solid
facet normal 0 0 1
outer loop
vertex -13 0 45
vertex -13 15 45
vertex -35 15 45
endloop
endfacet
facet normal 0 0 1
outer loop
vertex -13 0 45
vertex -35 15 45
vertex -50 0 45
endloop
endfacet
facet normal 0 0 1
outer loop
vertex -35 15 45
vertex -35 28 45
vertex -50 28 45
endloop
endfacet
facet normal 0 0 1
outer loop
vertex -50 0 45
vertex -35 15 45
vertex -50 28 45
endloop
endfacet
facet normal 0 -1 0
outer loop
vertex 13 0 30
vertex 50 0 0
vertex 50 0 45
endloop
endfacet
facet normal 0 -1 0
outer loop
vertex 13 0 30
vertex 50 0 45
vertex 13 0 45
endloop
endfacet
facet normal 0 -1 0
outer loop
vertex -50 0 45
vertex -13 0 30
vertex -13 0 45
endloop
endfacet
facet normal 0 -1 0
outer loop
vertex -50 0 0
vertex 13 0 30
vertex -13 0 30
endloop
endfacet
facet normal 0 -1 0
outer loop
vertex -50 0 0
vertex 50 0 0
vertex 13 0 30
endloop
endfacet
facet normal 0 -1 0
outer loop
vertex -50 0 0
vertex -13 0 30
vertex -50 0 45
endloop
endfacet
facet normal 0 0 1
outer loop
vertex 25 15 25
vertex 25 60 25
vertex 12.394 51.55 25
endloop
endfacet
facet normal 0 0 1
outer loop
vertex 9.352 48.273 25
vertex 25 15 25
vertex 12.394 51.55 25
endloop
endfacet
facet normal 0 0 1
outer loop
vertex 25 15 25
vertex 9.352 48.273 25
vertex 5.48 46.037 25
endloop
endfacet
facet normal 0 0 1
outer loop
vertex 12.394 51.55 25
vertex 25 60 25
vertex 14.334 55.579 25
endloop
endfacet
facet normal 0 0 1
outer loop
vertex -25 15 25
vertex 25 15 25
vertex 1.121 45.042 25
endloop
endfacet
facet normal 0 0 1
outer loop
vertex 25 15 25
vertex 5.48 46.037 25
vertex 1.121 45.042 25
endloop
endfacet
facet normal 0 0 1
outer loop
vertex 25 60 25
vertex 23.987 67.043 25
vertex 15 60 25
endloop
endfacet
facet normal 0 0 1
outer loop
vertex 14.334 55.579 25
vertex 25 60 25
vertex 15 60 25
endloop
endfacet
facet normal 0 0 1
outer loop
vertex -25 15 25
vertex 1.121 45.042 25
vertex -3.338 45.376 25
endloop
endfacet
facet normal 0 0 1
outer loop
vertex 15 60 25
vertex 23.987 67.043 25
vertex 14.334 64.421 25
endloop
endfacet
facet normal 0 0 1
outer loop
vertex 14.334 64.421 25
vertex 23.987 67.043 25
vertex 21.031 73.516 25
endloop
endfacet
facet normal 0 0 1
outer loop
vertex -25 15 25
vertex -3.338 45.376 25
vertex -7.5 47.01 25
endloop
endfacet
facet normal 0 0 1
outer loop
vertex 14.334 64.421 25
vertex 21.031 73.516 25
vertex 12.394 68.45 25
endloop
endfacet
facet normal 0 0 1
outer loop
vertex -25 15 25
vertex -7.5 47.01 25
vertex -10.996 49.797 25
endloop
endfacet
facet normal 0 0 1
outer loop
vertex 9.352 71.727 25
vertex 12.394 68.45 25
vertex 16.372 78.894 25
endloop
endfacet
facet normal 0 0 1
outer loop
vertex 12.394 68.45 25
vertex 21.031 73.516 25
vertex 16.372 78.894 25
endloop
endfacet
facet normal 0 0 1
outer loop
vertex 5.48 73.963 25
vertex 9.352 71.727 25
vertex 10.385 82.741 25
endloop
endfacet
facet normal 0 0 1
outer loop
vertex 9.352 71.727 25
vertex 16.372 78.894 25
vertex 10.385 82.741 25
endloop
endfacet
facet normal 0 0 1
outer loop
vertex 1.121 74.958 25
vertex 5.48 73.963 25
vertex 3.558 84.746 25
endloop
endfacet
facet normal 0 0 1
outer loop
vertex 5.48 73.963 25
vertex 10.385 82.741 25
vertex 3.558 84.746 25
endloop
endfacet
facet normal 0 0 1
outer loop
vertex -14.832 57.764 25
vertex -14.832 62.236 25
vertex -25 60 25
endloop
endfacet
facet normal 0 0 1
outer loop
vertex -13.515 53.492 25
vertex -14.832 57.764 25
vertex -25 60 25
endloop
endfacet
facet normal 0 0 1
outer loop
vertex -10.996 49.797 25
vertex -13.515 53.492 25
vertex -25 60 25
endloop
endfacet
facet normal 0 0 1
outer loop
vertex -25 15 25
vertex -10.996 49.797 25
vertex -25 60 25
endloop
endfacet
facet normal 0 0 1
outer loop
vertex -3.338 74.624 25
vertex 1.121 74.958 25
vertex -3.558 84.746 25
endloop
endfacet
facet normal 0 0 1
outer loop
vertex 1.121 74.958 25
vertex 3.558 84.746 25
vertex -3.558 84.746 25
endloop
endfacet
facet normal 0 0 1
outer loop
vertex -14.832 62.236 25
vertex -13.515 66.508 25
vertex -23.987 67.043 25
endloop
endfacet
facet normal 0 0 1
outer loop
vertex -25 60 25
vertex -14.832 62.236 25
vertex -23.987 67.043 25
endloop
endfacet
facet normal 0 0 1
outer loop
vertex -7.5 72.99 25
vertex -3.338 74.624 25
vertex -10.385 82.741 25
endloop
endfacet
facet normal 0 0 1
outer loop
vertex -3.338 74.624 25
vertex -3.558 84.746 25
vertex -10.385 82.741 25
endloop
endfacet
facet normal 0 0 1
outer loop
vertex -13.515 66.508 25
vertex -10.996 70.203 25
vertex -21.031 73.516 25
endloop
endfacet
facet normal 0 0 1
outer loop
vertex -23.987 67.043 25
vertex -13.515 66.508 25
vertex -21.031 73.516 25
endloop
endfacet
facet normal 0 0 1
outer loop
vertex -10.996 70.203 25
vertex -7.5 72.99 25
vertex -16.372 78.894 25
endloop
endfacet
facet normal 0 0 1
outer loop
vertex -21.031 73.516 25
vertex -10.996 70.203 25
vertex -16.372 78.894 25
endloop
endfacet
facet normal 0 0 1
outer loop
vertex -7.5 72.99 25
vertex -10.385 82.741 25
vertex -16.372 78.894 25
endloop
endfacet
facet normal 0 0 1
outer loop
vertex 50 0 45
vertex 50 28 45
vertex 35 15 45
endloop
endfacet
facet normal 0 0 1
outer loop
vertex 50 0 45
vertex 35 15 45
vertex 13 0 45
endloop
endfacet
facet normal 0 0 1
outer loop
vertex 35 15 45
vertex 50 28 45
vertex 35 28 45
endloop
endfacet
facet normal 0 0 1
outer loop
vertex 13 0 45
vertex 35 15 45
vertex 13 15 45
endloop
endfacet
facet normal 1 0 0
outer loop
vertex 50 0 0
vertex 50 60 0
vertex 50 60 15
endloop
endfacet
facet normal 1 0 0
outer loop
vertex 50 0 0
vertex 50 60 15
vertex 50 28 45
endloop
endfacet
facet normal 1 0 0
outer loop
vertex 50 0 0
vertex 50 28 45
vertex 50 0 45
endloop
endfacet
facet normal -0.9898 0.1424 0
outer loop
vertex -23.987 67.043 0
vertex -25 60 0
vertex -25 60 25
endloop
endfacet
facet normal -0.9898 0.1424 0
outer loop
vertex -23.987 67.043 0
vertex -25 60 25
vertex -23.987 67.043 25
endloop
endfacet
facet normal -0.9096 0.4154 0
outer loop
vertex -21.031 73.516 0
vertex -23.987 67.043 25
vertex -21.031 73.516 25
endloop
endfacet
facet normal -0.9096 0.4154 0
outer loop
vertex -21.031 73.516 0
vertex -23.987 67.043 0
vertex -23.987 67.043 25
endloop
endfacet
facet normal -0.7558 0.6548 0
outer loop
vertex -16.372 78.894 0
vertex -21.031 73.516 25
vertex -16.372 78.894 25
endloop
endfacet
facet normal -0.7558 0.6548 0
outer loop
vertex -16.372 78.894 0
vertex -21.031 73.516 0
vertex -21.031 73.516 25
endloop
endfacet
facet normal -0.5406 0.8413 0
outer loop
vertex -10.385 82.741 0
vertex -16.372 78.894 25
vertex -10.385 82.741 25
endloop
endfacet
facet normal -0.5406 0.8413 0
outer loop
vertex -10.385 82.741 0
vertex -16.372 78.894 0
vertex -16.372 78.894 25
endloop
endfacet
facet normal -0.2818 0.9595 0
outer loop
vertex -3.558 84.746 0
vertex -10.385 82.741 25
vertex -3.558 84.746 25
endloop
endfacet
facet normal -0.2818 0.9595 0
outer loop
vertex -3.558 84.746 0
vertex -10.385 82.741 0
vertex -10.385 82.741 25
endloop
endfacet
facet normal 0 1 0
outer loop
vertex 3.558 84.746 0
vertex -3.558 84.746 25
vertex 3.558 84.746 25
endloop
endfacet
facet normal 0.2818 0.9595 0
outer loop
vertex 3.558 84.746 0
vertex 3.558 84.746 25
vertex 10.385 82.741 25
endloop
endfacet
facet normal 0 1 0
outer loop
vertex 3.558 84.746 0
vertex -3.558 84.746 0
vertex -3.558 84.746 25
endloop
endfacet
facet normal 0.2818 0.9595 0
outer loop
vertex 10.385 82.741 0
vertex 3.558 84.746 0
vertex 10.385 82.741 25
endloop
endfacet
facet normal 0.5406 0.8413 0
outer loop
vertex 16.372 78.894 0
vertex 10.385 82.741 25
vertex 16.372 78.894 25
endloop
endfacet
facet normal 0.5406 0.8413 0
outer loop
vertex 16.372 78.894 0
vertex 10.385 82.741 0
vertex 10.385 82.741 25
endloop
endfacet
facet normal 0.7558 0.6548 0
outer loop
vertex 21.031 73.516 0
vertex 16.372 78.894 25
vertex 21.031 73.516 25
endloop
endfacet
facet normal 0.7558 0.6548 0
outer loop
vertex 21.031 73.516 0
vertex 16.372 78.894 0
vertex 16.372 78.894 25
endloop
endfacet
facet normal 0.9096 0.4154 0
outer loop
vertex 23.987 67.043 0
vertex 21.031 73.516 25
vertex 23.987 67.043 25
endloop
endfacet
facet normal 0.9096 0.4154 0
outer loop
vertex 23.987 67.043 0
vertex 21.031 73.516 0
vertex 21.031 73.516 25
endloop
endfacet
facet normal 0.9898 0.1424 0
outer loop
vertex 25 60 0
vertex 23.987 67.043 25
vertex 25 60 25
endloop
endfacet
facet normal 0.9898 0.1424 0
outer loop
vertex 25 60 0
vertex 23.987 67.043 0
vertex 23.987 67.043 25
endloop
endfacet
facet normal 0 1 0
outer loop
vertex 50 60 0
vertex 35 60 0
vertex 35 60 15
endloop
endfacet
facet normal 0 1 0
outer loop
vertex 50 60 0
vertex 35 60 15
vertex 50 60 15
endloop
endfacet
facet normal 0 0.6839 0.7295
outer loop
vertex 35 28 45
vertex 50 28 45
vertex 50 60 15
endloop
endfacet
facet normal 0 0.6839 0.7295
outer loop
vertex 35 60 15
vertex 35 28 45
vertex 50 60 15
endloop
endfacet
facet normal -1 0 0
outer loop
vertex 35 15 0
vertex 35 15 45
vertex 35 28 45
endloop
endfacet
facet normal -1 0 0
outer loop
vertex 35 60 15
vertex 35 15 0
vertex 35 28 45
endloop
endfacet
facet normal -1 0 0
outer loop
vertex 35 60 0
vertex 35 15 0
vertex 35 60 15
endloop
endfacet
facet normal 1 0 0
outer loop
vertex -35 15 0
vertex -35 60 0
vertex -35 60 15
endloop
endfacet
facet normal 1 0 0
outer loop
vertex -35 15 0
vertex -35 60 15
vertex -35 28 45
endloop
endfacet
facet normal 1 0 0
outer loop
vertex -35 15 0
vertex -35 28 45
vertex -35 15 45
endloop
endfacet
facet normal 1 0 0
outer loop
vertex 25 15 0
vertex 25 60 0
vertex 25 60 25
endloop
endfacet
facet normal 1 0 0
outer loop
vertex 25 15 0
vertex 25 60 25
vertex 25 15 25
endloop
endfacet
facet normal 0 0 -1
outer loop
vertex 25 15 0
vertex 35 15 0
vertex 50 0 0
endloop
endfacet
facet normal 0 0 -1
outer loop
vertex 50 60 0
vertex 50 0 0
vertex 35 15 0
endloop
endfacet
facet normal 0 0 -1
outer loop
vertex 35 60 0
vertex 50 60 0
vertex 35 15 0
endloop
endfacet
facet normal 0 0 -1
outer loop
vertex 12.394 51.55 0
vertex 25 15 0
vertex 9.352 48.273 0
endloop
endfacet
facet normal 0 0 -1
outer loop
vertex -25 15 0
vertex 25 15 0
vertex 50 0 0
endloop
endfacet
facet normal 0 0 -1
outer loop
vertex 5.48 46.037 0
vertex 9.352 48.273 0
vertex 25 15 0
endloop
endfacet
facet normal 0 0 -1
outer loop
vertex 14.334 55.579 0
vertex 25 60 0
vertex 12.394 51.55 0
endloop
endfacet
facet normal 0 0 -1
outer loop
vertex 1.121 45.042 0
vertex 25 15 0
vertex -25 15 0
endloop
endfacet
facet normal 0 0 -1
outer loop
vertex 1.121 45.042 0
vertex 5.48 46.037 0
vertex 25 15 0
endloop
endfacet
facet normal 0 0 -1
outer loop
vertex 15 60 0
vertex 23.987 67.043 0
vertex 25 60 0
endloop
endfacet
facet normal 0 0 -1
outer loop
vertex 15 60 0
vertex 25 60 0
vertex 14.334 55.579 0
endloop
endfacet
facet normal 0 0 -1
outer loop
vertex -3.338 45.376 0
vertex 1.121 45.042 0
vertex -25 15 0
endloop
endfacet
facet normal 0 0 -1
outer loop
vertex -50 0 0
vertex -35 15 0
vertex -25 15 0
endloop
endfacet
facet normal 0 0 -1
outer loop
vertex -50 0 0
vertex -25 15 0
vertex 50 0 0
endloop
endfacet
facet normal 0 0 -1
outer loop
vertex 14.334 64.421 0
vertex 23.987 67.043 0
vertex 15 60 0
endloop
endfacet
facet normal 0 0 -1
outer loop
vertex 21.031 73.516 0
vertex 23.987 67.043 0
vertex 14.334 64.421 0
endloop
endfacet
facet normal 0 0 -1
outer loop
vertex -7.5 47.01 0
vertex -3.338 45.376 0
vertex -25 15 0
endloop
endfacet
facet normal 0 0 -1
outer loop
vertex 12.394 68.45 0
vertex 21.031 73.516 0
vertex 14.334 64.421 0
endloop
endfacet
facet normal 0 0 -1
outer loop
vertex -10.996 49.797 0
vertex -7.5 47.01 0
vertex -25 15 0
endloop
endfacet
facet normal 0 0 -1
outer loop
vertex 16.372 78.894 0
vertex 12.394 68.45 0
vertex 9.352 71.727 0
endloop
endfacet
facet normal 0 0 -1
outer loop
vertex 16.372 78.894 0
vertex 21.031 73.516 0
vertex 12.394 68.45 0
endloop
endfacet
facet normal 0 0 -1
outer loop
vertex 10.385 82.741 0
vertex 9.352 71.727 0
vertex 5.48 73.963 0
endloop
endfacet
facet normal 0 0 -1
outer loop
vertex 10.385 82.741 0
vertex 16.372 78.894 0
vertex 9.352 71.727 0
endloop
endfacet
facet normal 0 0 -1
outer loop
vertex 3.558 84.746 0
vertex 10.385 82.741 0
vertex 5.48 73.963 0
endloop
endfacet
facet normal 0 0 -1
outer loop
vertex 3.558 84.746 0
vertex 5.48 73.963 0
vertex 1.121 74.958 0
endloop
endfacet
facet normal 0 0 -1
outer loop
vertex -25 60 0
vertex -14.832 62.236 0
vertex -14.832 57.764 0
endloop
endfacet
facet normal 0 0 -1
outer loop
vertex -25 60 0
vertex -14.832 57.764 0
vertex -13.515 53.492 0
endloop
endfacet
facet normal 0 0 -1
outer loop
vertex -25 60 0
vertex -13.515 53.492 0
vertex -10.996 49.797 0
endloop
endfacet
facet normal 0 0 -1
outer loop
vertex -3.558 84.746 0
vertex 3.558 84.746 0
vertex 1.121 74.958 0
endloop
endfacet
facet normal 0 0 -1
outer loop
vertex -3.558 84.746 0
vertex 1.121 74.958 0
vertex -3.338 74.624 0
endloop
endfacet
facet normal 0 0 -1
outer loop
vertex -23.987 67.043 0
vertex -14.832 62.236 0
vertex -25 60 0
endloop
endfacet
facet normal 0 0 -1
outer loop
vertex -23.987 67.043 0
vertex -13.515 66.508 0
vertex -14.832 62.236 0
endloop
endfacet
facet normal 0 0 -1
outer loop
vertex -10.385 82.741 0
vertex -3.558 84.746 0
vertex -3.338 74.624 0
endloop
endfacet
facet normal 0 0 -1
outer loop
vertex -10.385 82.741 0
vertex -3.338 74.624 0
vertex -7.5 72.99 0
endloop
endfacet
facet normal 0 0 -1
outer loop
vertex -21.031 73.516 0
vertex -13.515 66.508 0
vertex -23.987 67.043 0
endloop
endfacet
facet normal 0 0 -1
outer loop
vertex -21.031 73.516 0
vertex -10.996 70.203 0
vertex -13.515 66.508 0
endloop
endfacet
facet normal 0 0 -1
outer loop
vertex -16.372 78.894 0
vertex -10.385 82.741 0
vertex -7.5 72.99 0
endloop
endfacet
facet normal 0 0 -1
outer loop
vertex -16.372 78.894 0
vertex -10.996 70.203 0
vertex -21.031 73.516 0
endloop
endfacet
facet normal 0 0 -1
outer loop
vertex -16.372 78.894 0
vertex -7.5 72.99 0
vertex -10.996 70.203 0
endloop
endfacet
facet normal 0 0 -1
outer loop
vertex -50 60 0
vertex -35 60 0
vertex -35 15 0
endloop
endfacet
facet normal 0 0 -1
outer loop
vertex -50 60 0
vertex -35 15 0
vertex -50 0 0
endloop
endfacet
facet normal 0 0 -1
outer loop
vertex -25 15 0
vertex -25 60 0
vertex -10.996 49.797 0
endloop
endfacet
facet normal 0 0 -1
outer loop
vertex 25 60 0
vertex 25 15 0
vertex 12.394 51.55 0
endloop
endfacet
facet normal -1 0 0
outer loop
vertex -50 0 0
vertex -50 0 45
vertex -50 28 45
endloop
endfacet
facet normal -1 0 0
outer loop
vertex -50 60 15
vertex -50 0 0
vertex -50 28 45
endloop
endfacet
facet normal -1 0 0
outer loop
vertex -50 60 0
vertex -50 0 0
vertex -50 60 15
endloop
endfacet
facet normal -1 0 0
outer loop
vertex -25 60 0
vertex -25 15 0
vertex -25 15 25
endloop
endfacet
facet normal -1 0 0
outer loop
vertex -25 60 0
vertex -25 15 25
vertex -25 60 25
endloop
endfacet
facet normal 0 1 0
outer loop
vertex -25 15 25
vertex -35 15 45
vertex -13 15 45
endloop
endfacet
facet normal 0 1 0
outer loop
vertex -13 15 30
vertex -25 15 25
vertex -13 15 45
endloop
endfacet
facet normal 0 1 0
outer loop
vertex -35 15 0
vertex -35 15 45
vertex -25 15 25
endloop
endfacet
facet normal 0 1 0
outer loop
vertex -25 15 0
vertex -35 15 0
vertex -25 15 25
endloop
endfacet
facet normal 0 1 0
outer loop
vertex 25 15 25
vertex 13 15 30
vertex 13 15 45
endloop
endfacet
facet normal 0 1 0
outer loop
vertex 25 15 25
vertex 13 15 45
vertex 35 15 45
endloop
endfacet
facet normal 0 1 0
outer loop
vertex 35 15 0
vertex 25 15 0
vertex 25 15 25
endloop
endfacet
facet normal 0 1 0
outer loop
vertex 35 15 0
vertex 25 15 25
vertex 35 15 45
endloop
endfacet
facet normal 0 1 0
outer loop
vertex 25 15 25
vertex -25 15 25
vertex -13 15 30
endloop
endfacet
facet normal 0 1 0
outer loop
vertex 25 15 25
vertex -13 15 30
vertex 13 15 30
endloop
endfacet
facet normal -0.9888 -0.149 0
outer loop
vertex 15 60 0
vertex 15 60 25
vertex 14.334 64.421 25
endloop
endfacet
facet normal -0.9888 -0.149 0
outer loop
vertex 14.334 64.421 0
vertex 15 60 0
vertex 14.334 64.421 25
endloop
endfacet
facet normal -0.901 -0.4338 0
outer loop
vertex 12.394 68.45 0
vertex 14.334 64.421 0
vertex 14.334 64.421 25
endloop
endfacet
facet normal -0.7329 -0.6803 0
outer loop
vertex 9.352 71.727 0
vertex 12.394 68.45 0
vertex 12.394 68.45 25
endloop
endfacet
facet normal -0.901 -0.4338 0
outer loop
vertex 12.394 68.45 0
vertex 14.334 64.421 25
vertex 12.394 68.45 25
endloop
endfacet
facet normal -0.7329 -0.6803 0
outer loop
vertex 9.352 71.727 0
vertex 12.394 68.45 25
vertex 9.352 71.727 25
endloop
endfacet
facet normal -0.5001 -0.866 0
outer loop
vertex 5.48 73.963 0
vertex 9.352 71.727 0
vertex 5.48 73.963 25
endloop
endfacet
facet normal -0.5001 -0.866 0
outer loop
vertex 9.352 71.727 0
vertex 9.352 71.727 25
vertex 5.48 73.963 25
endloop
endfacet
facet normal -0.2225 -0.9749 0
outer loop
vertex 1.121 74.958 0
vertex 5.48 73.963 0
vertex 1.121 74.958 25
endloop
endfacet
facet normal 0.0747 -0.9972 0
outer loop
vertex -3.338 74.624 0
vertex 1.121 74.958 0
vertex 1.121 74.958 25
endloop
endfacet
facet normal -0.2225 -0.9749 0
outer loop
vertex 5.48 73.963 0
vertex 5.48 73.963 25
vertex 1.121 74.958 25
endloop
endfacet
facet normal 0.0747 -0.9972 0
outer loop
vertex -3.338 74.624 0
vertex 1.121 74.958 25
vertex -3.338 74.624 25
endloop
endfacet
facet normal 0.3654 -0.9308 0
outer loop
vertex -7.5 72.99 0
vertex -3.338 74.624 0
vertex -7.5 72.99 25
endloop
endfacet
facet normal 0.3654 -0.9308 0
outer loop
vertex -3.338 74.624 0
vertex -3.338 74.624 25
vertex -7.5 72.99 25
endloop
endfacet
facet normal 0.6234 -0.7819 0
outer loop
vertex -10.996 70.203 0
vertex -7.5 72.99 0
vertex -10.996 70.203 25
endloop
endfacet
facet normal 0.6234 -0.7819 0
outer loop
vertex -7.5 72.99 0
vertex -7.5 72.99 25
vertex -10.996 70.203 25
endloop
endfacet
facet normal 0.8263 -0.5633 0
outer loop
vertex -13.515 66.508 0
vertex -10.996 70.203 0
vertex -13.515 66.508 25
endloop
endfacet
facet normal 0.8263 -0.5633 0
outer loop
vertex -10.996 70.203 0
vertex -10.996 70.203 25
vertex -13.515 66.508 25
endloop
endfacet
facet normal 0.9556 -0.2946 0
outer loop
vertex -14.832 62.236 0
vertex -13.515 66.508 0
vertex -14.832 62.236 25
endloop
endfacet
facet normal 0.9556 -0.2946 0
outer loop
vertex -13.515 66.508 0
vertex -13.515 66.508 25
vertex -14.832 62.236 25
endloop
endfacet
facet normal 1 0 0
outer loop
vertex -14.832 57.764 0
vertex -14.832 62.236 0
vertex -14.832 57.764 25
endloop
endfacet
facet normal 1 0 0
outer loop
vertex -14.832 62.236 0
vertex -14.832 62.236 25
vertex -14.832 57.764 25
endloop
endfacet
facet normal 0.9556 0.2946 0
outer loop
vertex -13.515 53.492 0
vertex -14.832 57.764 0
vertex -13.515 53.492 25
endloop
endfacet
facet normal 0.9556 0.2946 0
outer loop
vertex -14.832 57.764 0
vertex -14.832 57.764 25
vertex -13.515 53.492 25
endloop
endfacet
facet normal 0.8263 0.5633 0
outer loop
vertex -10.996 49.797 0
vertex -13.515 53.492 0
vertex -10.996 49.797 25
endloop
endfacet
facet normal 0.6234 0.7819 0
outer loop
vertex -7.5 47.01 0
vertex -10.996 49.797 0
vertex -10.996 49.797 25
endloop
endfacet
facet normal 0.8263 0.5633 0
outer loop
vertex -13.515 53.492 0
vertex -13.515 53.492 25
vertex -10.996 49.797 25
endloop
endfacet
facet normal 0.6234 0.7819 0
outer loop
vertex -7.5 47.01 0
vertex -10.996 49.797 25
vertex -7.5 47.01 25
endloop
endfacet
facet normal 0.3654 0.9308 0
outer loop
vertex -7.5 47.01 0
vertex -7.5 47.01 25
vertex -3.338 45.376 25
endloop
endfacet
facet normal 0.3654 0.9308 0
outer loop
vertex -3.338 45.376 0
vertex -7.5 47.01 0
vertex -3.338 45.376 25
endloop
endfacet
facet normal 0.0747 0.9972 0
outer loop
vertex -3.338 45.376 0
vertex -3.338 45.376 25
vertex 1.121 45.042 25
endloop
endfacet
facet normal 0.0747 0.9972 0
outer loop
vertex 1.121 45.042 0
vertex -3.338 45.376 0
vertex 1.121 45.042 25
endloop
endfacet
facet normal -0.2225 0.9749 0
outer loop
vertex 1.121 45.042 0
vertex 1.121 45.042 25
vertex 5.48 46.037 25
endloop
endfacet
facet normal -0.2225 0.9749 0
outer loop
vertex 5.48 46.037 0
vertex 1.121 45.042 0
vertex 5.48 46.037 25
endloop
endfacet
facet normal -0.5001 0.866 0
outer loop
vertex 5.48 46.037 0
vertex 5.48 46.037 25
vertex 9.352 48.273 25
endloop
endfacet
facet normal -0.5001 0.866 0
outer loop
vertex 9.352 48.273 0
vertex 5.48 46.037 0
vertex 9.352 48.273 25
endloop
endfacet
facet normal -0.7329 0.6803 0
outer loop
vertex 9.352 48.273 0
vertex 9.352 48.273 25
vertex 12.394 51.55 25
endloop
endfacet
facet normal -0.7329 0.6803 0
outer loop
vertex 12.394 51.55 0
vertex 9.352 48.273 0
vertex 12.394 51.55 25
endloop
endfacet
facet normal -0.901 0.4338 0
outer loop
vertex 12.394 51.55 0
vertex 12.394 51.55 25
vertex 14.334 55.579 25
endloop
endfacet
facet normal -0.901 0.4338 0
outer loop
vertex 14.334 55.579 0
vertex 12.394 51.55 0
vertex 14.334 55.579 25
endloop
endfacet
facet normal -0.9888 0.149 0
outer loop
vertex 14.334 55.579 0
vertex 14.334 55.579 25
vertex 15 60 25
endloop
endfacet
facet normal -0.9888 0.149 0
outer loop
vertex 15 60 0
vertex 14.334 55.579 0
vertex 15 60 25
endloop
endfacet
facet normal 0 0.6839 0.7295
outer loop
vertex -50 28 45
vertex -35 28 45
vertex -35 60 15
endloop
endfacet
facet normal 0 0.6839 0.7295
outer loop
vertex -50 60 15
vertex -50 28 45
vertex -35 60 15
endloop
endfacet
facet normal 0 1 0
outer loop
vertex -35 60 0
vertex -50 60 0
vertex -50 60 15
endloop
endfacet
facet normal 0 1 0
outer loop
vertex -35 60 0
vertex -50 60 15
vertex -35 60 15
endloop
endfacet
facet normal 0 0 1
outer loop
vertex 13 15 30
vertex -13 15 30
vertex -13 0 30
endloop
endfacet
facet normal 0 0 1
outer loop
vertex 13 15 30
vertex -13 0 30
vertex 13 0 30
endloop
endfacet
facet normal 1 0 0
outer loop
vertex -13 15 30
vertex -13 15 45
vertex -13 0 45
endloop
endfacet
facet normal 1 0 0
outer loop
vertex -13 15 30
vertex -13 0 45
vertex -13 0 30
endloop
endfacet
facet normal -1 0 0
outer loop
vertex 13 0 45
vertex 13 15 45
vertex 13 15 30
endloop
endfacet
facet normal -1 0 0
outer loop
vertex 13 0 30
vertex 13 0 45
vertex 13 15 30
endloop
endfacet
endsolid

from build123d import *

# Parameters (mm, degrees)
BOSS_EXTRUDE1_DEPTH = 45
CUT_EXTRUDE1_DEPTH  = 126
SKETCH3_W           = 26
SKETCH3_H           = 15
CUT_EXTRUDE2_DEPTH  = 81.932070281
BOSS_EXTRUDE2_DEPTH = 25
SKETCH5_R           = 15
CUT_EXTRUDE3_DEPTH  = 102.734949747


with BuildPart() as part:
    # Sketch1 → Boss-Extrude1 (new body)
    with BuildSketch(Plane.XY):
        Polygon((-50, 0), (-50, 60), (-35, 60), (-35, 15), (35, 15), (35, 60), (50, 60), (50, 0), align=None)
    extrude(amount=BOSS_EXTRUDE1_DEPTH)

    # Sketch2 → Cut-Extrude1 (cut, through all)
    with BuildSketch(Plane(origin=(50, 0, 0), x_dir=(0, 0, -1), z_dir=(1, 0, 0))):
        Polygon((-15, 60), (-45, 60), (-45, 28), align=None)
    extrude(amount=-CUT_EXTRUDE1_DEPTH, mode=Mode.SUBTRACT)

    # Sketch3 → Cut-Extrude2 (cut, through all)
    with BuildSketch(Plane(origin=(0, 15, 0), x_dir=(1, 0, 0), z_dir=(0, 1, 0))):
        with Locations((0, -37.5)):
            Rectangle(SKETCH3_W, SKETCH3_H)
    extrude(amount=-CUT_EXTRUDE2_DEPTH, mode=Mode.SUBTRACT)

    # Sketch4 → Boss-Extrude2 (add)
    with BuildSketch(Plane(origin=(0, 0, 0), x_dir=(-1, 0, 0), z_dir=(0, 0, -1))):
        with BuildLine():
            Line((25, 15), (25, 60))
            ThreePointArc((25, 60), (0, 85), (-25, 60))
            Line((-25, 60), (-25, 15))
            Line((-25, 15), (25, 15))
        make_face()
    extrude(amount=-BOSS_EXTRUDE2_DEPTH)

    # Sketch5 → Cut-Extrude3 (cut, through all)
    with BuildSketch(Plane.XY.offset(25)):
        with Locations((0, 60)):
            Circle(SKETCH5_R)
    extrude(amount=-CUT_EXTRUDE3_DEPTH, mode=Mode.SUBTRACT)


solid = part.part
